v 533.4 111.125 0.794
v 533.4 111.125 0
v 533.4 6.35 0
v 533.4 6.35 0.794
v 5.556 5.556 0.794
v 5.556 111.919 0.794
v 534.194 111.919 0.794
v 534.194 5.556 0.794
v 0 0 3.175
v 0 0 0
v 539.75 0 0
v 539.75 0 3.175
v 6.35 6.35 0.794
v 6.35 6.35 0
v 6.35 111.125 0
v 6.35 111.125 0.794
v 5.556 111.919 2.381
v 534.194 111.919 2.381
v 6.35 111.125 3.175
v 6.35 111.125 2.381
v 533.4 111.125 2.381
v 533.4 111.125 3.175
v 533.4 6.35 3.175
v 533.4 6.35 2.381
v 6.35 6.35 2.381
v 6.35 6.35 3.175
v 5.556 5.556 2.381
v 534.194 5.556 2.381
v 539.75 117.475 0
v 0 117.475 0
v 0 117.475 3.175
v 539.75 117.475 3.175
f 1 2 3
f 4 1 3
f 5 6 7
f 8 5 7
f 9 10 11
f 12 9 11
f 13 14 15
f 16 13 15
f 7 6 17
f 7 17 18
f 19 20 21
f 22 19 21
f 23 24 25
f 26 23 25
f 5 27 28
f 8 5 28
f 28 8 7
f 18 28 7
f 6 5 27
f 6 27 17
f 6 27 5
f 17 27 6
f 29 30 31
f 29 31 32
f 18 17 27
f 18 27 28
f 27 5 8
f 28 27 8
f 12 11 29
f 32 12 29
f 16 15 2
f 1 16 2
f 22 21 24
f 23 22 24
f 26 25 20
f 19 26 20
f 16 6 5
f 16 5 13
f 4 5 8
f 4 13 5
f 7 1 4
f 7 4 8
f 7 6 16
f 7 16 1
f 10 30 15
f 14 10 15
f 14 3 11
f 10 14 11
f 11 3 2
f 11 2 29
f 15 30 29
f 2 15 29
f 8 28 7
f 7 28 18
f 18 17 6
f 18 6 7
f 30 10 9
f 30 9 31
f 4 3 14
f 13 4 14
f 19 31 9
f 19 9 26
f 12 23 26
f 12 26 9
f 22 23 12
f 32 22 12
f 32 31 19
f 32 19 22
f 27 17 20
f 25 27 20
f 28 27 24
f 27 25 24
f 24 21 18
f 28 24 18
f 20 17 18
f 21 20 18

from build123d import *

# Parameters (mm, degrees)
F0_W     = 539.75
F0_H     = 117.475
F1_DEPTH = 3.175
F2_W     = 528.6375
F2_H     = 106.3625
F3_DEPTH = 1.5875
F5_DEPTH = 1.5875


with BuildPart() as f1:
    # F0 (on Top) → F1 (new body)
    with BuildSketch(Plane.XY):
        with Locations((269.875, 58.7375)):
            Rectangle(F0_W, F0_H)
        Polygon((6.35, 6.35), (6.35, 57.15), (6.35, 111.125), (533.4, 111.125), (533.4, 6.35), align=None, mode=Mode.SUBTRACT)
    extrude(amount=F1_DEPTH)



with BuildPart() as f3:
    # F2 (on Top) → F3 (new body)
    with BuildSketch(Plane.XY):
        with Locations((270.66875, 59.53125)):
            Rectangle(F2_W, F2_H)
    extrude(amount=F3_DEPTH)


with BuildPart() as f3_1:
    # F4: moved
    add(f3.part.moved(Location((-0.79375, -0.79375, 0.79375))))


with BuildPart() as f1_1:
    add(f1.part)
    # F5 (cut): a face of the model
    f5_faces = [f3_1.part.faces().sort_by_distance(p)[0] for p in [
        (269.875, 58.7375, 2.38125),
    ]]
    extrude(f5_faces, amount=-F5_DEPTH, mode=Mode.SUBTRACT)


solid = Compound([f3_1.part, f1_1.part])
